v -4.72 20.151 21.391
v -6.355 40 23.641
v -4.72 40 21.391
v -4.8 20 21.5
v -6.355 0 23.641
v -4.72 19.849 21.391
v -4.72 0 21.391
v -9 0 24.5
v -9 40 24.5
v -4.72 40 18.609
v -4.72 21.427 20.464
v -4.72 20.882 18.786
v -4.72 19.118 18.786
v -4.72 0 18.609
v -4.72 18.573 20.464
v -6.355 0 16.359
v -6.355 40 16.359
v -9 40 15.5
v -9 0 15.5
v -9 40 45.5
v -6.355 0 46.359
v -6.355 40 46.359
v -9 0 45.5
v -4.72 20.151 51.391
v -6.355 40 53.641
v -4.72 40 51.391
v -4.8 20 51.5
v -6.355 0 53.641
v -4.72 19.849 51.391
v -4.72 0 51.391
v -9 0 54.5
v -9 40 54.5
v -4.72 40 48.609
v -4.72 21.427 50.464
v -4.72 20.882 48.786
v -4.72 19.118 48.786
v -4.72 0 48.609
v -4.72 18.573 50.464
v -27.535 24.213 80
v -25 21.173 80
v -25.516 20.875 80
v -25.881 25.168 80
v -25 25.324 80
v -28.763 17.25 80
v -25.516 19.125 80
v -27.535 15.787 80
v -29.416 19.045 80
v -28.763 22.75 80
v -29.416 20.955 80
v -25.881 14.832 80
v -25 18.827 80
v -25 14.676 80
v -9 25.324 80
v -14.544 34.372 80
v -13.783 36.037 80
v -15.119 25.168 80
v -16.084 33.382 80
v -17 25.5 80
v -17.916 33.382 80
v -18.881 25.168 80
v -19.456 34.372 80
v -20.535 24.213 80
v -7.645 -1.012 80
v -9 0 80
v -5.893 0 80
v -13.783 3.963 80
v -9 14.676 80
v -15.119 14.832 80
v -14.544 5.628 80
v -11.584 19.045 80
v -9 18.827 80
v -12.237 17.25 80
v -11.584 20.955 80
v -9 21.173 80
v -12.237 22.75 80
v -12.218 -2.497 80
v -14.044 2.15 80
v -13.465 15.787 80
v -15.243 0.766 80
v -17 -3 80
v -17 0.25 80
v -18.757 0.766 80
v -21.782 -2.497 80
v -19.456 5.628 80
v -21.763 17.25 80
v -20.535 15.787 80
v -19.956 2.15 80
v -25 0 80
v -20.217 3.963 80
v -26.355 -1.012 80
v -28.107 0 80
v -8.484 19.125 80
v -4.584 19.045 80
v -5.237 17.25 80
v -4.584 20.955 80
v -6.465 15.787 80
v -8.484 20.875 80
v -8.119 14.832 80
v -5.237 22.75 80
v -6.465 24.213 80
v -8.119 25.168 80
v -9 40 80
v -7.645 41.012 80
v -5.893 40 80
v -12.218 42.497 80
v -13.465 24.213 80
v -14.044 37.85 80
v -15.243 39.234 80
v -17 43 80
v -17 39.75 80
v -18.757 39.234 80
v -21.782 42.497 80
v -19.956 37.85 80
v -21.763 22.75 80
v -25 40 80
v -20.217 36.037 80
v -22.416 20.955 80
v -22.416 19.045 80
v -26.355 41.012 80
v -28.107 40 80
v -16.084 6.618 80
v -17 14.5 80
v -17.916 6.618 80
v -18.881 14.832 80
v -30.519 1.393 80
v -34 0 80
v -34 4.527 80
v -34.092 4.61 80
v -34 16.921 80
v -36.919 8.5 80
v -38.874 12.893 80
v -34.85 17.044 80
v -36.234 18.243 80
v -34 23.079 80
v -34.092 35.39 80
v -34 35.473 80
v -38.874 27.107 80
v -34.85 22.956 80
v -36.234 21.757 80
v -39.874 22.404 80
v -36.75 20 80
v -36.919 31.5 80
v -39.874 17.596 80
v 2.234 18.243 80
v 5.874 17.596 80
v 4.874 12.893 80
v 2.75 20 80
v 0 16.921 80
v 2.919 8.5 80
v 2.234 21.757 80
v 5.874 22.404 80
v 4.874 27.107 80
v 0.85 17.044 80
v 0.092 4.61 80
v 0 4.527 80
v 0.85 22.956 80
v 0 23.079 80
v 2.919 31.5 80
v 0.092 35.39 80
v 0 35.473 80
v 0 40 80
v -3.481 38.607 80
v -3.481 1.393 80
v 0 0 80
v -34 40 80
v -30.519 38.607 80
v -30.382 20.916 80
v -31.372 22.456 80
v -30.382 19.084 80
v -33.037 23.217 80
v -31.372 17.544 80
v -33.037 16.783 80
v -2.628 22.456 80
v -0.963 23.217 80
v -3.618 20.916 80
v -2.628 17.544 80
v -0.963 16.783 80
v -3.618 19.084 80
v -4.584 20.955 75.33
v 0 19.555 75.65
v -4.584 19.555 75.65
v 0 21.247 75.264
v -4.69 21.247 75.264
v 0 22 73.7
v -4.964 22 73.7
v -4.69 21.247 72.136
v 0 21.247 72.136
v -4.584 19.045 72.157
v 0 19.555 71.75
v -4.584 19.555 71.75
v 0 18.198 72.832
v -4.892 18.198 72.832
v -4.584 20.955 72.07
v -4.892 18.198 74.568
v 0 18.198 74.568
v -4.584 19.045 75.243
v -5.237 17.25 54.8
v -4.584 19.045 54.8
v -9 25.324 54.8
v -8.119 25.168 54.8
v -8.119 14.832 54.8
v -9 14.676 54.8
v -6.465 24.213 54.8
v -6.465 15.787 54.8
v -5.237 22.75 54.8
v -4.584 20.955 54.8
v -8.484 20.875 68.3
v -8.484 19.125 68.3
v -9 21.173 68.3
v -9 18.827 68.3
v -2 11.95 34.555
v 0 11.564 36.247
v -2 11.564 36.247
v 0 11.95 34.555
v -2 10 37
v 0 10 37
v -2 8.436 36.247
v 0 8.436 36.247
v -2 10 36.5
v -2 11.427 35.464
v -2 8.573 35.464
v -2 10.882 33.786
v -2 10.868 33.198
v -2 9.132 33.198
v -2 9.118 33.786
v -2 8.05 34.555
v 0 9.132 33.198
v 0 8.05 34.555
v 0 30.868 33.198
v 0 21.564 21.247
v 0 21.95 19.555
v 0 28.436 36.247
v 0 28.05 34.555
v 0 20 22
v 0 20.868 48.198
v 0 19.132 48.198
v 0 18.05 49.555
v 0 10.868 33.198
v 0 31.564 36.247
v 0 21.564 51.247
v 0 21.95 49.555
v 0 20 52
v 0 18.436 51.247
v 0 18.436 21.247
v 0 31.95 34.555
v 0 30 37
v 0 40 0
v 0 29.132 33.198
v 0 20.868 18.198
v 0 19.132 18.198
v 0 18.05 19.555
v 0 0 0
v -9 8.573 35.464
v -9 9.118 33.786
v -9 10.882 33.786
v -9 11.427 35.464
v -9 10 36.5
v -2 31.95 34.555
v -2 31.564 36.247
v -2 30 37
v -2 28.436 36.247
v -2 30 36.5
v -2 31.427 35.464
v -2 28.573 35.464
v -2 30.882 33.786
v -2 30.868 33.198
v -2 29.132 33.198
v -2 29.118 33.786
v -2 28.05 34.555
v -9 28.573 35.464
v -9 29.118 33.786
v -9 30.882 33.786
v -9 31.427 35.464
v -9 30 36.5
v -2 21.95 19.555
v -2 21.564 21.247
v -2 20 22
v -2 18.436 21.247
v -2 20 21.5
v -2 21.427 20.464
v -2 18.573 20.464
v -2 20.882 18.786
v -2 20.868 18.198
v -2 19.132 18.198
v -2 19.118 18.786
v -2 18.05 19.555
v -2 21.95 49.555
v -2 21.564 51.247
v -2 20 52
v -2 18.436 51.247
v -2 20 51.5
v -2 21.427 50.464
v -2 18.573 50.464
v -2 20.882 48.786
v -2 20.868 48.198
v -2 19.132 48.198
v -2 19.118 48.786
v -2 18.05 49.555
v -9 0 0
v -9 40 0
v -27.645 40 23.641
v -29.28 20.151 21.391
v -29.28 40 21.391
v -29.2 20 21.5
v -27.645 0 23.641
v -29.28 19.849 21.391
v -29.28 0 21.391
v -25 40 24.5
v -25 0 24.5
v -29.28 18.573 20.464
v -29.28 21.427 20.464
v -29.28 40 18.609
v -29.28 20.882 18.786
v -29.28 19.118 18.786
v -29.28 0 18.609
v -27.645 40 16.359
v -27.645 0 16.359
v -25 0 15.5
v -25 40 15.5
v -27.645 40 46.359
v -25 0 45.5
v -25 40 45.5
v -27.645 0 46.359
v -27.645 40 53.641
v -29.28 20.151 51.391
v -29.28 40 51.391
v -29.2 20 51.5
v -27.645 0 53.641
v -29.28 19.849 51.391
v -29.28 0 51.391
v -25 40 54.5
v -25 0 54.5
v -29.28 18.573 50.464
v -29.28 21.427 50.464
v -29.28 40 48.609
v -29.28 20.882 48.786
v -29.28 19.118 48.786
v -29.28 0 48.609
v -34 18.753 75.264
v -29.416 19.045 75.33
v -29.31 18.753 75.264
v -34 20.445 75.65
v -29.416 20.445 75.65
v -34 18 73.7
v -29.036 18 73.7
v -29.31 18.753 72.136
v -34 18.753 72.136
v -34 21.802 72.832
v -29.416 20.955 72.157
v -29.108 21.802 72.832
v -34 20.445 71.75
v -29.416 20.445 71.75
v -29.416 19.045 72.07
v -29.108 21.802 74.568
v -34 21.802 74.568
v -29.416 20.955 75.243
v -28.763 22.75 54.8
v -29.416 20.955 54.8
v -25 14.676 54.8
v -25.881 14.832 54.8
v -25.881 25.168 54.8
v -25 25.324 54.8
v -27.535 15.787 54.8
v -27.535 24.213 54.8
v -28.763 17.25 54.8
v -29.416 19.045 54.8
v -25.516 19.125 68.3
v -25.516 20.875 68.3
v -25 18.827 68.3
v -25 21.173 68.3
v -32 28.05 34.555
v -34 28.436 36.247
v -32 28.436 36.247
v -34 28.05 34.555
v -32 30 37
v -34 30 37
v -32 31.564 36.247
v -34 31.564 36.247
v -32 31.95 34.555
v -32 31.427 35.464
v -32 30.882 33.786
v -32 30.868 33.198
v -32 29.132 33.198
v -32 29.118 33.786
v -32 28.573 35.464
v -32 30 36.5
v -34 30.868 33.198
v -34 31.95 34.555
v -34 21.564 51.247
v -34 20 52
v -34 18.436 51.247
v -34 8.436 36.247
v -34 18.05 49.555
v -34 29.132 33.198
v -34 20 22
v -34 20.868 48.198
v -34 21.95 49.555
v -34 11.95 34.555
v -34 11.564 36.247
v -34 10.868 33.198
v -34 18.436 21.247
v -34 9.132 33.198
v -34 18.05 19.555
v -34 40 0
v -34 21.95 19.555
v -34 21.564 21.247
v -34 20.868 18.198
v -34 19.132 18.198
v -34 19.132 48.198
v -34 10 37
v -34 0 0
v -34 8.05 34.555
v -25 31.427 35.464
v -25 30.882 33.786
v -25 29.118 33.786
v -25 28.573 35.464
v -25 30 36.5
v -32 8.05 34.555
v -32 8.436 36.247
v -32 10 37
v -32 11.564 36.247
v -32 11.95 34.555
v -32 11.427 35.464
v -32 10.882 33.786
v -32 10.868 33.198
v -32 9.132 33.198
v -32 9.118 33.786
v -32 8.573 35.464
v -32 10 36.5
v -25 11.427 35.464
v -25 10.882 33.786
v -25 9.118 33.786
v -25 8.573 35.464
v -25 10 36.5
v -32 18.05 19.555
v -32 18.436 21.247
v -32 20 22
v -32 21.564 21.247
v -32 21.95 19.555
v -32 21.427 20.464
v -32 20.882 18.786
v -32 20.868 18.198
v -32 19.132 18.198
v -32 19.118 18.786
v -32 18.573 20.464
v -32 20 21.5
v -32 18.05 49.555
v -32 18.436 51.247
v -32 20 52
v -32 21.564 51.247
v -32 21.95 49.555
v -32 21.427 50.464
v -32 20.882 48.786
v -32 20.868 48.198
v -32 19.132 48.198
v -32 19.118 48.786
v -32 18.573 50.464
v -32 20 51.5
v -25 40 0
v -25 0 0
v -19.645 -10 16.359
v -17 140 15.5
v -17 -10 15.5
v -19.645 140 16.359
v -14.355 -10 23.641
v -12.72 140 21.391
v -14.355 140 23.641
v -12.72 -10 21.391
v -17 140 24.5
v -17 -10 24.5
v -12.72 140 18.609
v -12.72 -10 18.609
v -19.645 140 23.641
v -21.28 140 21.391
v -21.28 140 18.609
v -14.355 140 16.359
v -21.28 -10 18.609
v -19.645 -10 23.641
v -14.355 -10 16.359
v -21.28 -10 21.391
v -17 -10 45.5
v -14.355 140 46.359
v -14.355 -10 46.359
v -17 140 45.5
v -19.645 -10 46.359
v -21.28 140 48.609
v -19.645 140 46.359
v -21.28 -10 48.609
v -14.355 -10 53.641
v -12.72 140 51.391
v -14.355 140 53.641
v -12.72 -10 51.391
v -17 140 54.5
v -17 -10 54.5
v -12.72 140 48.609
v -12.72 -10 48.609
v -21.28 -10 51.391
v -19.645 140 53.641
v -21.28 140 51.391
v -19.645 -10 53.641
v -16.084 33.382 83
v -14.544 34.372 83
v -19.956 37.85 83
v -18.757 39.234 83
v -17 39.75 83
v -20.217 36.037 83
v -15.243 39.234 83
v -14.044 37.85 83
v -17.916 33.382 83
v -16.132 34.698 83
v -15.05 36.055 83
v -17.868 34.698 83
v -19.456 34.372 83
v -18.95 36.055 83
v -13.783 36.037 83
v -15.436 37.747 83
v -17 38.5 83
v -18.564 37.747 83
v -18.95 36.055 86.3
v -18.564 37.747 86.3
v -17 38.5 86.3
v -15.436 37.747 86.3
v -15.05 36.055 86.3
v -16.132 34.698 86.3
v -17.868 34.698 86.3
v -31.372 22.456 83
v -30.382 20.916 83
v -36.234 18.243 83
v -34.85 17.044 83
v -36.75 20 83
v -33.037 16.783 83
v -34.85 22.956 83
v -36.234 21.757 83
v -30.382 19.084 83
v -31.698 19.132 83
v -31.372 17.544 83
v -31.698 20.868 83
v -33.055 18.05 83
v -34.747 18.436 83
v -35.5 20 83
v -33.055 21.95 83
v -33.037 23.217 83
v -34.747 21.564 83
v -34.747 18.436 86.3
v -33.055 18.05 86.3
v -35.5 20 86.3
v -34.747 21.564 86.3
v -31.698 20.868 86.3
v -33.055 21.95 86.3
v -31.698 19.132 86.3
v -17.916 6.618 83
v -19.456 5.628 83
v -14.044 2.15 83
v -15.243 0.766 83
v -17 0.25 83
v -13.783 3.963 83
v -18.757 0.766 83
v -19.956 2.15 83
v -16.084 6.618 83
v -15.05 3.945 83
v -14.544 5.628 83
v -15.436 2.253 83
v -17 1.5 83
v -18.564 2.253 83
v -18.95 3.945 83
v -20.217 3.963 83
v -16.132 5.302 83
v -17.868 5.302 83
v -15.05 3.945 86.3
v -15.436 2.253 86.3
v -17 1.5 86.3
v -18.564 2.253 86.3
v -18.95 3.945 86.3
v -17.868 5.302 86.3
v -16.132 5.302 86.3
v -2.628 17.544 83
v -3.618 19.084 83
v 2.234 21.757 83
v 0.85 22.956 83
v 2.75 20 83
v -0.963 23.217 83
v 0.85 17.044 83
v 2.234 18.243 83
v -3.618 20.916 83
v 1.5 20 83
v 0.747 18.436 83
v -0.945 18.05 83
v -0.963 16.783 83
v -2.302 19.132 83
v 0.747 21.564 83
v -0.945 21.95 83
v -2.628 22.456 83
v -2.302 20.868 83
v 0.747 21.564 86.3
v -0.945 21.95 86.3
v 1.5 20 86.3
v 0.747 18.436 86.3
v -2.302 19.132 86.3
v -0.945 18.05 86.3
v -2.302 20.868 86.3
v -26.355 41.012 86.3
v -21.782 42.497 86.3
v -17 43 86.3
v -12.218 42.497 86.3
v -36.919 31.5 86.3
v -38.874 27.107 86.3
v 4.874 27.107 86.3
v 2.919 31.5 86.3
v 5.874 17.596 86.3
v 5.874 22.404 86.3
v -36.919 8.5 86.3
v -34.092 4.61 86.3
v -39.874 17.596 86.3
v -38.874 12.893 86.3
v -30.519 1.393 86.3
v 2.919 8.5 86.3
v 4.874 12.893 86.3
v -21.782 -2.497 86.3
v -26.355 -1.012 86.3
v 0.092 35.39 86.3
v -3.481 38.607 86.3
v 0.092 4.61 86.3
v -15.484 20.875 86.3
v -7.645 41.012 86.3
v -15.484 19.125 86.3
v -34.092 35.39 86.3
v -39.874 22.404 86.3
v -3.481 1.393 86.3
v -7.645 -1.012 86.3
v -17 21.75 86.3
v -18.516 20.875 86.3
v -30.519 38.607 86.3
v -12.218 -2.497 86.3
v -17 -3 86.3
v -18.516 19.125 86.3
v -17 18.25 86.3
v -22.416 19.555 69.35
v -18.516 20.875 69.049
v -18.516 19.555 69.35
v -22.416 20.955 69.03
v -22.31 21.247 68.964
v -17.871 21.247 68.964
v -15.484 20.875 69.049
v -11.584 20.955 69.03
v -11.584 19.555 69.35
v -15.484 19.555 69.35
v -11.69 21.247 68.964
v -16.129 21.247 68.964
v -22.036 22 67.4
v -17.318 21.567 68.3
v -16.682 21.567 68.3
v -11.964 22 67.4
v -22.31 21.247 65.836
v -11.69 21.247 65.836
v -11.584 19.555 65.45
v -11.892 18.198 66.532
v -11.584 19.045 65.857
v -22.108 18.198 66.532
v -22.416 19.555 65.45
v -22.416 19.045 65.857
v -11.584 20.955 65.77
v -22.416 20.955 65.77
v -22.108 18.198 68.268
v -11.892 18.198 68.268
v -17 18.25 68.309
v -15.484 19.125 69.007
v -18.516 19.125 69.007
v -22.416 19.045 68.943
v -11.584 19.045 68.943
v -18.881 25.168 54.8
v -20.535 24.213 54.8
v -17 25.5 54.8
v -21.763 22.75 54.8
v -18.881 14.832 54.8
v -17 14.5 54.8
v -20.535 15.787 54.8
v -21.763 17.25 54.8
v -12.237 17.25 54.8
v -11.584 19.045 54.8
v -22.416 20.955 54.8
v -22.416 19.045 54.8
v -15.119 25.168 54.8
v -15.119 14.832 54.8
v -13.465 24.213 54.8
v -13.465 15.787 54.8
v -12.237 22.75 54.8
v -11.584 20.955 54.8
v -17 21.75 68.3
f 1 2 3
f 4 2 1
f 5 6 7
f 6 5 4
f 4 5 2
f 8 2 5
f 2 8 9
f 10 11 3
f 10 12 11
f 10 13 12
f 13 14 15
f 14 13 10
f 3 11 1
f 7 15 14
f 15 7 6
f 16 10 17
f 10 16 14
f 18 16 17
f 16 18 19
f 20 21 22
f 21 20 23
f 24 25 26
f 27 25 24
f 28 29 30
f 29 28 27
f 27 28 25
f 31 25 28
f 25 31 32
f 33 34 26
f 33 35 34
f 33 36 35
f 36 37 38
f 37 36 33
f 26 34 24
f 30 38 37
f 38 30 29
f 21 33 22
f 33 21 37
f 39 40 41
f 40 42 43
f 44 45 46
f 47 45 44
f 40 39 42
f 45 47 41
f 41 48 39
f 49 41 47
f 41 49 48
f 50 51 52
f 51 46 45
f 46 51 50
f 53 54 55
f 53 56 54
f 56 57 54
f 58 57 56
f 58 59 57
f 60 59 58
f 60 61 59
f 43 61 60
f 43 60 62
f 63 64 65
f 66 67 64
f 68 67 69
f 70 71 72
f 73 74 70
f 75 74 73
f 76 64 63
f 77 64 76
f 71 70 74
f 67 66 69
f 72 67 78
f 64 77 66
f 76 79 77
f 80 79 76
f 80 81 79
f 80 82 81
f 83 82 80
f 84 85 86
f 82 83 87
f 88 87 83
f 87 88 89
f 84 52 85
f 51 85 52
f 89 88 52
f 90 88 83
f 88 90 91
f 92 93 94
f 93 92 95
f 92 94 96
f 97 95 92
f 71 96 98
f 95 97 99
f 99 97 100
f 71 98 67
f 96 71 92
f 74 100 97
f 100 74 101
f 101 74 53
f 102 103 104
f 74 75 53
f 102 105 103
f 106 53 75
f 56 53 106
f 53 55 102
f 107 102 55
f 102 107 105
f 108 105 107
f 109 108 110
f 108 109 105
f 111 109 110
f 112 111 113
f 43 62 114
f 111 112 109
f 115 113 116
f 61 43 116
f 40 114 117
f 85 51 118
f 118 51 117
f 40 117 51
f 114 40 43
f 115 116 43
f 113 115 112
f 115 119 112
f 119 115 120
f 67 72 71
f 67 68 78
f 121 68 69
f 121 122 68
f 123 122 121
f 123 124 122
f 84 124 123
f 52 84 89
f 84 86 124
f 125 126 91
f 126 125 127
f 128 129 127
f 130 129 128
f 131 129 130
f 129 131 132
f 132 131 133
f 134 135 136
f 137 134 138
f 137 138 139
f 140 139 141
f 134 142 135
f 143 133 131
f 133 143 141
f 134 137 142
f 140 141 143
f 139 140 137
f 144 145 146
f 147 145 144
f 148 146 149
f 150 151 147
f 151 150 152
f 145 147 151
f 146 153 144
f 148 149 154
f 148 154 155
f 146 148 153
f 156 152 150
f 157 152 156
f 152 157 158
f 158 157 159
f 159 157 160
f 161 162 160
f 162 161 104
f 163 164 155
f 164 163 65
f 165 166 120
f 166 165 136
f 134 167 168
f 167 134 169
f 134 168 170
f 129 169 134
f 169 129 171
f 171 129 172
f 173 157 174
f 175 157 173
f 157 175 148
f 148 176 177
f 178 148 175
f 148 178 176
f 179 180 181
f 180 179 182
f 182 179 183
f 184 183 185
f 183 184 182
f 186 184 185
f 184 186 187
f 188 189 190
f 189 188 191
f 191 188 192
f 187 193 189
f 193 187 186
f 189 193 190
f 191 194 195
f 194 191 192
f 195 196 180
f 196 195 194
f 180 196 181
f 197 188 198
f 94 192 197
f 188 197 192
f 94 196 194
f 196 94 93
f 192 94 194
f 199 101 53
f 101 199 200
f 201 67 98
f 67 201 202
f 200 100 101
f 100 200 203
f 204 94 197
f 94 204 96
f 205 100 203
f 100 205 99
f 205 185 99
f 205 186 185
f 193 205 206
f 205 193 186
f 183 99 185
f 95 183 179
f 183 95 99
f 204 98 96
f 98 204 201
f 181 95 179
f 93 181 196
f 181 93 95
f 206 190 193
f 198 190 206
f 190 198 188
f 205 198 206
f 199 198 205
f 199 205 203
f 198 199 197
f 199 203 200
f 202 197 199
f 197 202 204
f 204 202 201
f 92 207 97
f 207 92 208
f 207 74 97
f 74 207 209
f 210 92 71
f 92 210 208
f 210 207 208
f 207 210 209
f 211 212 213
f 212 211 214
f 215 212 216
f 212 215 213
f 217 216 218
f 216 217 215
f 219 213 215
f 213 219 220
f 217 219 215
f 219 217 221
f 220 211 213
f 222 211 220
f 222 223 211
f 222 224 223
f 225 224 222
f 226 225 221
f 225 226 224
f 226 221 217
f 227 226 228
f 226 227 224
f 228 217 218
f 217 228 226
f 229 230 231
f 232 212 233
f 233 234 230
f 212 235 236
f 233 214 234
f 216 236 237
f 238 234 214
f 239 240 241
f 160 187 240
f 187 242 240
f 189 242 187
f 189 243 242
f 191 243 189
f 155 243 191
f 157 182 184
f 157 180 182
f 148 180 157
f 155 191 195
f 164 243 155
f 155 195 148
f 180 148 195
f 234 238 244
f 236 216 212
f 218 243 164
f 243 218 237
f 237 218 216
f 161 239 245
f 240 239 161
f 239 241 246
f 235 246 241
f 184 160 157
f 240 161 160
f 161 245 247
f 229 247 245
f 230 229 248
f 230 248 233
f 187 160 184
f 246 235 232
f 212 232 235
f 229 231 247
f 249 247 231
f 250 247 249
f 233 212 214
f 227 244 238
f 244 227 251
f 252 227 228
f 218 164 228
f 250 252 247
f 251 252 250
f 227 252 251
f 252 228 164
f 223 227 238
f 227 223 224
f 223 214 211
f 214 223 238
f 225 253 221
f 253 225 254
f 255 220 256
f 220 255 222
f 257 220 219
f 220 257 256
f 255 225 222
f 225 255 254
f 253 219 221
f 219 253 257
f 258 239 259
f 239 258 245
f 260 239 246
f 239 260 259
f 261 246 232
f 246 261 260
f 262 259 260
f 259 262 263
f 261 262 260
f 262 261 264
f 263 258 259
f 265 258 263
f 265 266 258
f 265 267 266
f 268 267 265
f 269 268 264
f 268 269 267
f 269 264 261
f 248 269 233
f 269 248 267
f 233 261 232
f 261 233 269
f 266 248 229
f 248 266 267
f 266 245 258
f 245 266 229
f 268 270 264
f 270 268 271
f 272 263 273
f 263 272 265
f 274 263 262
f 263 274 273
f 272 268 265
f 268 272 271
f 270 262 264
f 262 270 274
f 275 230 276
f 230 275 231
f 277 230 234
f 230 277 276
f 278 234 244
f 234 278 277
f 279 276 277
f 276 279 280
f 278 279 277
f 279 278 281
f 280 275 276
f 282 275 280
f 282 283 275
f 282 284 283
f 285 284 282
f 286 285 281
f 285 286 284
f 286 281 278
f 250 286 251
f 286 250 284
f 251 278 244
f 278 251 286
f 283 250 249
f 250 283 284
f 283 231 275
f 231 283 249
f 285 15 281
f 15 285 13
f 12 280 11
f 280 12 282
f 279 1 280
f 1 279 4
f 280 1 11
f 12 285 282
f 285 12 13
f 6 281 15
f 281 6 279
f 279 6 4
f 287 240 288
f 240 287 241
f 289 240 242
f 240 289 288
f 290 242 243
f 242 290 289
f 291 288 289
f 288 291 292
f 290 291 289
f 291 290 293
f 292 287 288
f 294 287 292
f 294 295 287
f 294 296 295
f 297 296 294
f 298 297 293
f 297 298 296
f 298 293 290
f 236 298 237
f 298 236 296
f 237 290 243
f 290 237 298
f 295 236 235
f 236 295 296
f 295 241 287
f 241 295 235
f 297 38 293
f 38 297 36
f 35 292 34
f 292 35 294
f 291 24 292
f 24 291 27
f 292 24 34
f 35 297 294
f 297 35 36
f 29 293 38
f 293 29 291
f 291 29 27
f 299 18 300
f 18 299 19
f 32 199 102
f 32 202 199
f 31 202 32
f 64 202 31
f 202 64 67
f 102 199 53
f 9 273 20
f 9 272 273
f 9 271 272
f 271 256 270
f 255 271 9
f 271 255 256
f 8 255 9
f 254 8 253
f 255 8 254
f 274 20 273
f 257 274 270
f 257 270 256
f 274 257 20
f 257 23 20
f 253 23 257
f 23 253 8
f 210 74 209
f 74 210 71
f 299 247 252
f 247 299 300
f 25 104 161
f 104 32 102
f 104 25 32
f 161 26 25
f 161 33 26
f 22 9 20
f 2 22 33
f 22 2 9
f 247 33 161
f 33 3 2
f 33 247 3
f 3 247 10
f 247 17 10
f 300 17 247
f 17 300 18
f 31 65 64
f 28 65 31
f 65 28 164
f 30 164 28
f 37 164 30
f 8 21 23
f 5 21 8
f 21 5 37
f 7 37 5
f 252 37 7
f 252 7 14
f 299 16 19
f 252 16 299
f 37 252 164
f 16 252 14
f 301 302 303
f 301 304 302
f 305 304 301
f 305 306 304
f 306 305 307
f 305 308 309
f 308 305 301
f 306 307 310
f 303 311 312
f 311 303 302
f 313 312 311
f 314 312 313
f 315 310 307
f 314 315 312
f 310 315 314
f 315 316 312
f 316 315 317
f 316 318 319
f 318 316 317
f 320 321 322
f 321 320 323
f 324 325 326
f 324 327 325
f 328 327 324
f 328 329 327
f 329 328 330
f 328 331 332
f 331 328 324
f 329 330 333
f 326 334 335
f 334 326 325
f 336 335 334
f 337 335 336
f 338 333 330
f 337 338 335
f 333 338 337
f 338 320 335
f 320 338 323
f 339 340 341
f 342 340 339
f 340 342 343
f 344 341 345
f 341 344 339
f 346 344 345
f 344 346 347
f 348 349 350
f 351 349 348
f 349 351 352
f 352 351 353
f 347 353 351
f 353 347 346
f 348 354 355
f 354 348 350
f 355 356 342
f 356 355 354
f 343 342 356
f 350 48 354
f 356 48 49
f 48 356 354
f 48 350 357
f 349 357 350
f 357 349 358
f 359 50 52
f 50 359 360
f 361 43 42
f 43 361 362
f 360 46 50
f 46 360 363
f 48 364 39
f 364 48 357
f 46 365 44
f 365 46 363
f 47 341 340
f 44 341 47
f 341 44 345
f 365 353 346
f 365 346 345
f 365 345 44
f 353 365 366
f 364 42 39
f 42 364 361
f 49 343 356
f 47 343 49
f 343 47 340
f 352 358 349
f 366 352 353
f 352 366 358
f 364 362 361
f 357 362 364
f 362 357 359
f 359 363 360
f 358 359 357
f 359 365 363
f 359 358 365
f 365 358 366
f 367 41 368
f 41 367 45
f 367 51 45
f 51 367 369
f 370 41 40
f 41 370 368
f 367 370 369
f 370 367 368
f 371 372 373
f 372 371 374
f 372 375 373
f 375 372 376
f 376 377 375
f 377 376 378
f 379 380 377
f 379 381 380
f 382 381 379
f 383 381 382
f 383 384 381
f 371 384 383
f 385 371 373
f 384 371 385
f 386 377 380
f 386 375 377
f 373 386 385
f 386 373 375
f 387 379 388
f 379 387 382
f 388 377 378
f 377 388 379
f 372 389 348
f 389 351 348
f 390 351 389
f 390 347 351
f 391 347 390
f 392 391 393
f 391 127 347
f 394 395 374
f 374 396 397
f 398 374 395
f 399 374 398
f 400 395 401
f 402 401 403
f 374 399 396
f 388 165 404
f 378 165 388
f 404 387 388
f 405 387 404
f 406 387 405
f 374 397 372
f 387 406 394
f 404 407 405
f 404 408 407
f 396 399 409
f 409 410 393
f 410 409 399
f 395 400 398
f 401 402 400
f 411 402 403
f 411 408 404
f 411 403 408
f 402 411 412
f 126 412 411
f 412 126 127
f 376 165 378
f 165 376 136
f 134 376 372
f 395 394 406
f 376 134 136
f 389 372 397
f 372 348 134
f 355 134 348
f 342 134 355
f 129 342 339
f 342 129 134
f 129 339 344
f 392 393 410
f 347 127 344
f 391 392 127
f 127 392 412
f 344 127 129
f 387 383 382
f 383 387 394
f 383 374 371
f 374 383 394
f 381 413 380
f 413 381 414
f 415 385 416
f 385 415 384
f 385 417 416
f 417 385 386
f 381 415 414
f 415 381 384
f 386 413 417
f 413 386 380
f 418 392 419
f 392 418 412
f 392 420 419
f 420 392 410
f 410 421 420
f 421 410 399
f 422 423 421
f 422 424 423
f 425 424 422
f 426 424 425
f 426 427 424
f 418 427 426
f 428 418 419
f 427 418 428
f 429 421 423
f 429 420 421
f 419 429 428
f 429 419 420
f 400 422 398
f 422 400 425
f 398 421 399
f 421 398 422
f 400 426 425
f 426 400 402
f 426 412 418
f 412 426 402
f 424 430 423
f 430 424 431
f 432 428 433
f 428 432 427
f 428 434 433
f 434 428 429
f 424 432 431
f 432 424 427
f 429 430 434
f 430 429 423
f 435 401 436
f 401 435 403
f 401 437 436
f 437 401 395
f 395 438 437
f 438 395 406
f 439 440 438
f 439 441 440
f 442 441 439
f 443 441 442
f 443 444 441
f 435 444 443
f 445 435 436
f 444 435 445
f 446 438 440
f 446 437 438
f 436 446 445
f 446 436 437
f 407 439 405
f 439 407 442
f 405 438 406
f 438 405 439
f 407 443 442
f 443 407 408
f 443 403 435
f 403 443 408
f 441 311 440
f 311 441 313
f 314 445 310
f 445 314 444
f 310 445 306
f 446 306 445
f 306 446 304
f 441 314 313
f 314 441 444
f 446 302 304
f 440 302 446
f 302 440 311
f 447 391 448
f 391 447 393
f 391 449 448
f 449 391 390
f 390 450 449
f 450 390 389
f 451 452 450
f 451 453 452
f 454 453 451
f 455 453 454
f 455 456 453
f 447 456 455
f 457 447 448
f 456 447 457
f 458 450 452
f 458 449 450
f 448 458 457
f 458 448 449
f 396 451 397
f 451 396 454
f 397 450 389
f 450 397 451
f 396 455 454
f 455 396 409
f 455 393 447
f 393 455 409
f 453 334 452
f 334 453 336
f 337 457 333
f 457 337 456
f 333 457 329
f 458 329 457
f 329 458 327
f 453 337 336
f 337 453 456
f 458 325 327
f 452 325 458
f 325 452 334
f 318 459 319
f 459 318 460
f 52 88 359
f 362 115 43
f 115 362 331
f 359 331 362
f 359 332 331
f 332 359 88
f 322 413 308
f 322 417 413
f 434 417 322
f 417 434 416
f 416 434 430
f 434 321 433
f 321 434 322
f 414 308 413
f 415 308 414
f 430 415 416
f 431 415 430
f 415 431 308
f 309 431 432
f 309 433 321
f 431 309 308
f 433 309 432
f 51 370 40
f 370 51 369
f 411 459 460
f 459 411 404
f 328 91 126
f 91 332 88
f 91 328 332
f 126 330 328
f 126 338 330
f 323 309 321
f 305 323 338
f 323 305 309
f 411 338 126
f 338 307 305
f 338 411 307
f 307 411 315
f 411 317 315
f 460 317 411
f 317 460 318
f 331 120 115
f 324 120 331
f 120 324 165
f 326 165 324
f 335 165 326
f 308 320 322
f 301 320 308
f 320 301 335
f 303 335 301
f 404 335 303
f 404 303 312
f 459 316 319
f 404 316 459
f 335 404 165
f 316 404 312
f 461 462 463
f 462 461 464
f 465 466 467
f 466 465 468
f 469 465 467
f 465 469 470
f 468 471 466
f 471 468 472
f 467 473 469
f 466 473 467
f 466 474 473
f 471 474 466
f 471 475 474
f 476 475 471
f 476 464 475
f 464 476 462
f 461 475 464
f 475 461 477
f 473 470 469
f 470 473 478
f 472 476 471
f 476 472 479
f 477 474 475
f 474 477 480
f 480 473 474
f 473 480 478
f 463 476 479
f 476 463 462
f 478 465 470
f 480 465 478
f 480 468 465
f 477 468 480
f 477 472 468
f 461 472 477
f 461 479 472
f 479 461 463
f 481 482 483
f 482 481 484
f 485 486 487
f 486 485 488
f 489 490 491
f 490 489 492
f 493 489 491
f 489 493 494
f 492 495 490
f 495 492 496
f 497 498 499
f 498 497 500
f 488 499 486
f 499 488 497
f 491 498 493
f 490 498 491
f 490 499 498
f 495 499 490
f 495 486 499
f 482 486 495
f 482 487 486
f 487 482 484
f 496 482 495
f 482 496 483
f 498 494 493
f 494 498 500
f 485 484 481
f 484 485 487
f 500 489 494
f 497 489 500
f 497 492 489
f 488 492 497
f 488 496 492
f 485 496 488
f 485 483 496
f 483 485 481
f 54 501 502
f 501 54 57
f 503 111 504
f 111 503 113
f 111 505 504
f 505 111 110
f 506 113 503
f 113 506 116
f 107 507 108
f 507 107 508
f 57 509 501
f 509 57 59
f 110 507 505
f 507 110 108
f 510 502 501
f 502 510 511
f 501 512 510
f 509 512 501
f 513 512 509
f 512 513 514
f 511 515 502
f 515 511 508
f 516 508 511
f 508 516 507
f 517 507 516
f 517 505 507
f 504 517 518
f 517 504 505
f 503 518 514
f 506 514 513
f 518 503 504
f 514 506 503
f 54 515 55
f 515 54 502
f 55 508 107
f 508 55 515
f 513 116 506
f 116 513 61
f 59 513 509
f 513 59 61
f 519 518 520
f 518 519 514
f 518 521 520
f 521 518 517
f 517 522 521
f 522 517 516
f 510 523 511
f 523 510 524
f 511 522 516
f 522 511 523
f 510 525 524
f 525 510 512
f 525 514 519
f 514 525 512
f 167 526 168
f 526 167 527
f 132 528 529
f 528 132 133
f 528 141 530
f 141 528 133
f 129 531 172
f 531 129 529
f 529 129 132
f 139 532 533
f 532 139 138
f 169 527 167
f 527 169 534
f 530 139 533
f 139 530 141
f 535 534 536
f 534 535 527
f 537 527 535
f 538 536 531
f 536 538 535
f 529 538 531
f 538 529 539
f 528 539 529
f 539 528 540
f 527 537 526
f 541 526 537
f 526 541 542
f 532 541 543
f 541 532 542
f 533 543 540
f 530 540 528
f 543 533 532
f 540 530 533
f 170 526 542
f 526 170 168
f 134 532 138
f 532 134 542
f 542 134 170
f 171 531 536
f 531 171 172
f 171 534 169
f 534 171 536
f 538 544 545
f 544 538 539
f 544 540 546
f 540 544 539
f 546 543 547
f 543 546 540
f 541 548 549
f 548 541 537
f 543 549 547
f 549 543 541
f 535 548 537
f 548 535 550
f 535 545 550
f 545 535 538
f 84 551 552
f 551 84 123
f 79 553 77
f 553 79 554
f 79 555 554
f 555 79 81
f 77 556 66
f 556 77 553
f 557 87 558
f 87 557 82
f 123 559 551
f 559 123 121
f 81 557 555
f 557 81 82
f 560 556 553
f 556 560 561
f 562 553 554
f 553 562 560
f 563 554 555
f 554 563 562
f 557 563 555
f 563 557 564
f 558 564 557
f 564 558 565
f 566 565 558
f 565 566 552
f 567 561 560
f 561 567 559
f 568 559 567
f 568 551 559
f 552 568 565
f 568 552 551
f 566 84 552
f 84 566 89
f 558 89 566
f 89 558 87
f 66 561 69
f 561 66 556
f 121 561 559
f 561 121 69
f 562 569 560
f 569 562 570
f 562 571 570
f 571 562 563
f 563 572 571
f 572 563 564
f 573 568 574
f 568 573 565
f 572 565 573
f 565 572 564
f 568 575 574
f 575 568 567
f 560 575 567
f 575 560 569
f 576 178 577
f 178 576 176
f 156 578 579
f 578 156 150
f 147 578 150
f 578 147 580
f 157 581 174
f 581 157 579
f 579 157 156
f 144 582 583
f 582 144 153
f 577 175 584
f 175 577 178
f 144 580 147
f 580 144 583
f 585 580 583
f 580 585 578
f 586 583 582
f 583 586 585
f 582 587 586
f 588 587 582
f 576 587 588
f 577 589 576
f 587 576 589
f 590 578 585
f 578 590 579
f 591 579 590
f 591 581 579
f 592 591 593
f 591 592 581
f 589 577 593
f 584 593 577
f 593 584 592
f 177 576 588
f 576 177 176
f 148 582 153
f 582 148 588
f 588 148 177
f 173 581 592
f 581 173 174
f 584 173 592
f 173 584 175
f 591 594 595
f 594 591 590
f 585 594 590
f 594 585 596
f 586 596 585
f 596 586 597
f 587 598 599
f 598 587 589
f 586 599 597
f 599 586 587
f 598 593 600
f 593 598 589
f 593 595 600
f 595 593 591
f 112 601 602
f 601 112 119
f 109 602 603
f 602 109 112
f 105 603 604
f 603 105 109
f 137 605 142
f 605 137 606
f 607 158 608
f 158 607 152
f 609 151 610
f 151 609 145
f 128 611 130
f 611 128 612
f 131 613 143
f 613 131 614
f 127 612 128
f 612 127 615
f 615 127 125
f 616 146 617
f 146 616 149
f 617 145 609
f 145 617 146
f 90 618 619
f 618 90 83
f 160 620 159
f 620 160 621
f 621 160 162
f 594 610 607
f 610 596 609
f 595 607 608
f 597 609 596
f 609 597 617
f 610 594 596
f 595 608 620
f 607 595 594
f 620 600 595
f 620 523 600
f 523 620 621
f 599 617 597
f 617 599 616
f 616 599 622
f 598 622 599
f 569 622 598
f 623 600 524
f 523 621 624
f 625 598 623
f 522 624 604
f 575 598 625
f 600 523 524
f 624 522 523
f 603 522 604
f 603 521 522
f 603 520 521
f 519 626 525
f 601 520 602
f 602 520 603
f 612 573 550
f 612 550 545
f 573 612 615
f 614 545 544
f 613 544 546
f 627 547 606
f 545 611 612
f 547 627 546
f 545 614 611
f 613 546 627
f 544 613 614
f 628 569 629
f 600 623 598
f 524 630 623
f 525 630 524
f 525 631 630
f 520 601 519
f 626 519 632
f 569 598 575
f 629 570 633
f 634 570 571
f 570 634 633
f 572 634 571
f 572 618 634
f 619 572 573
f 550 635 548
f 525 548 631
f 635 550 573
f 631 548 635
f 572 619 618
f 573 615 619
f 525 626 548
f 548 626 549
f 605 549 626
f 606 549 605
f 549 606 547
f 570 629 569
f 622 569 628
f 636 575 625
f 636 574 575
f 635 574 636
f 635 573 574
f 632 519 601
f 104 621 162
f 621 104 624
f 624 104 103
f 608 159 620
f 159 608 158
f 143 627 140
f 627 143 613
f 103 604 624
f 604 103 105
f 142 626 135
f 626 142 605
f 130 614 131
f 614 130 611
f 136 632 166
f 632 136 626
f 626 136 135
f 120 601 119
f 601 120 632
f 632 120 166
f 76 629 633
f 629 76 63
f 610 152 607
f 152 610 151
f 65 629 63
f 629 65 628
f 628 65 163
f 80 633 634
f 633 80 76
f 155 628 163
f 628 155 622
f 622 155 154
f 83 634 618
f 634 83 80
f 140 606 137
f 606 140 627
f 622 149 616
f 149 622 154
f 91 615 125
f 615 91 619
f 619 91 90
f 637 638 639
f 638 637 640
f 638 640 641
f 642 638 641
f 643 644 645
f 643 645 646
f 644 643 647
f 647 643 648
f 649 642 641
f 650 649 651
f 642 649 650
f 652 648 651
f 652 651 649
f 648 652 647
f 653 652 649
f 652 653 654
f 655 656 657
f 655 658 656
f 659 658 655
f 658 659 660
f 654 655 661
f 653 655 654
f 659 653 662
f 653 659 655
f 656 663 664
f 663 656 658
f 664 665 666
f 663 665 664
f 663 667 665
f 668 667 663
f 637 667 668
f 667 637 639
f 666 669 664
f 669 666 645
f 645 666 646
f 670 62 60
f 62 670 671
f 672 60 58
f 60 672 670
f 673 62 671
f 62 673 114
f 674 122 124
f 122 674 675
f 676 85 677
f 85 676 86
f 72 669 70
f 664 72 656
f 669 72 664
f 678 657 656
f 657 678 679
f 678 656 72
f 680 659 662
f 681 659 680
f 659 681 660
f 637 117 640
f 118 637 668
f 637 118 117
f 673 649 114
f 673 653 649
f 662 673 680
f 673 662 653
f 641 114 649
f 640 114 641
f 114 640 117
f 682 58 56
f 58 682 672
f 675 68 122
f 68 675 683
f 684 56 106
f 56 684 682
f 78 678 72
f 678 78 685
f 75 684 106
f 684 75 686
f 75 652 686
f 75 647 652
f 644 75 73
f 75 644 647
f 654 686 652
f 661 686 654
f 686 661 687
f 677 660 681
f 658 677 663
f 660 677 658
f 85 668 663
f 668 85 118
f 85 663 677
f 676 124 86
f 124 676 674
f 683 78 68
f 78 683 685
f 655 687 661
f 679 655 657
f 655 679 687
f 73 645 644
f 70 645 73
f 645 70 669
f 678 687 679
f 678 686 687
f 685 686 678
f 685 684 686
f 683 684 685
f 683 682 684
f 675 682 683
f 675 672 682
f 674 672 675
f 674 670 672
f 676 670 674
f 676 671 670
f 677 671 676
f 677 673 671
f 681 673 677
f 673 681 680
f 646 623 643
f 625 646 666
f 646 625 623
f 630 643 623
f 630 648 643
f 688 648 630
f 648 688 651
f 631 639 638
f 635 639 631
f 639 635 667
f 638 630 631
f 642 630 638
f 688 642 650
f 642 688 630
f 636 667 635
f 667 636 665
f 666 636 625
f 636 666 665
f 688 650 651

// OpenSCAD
// file: stanley.scad
use <hardware.scad>

module stanley(solid_screw = false) {
    motor_r = 23;
    stem_r = 5.5;
    retainer_r = stem_r;
    motor_disk_height = 6.3;
    screw_count = 4;
		stem_height = motor_disk_height * 3;
		back_axle_length = 18;

    difference () {
				union() {
						difference() {
								cylinder(r=motor_r, h=motor_disk_height);
								for (i = [0:screw_count-1]) {
										rotate(v=[0,0,1], a = i * 360 / screw_count) {
												translate(v=[16.5, 0, 0]) m3();
										}
								}
						}
	
						difference() {
								translate(v=[0, 0, -stem_height]) {
										cylinder(r=stem_r, h=stem_height);
								}
								
								if (!solid_screw) {
										translate(v=[0, 10, -stem_height + motor_disk_height]) {
												rotate (v=[1, 0, 0], 90) m3(40);
										}
								}
						}

						translate(v=[0, 0, -motor_disk_height - stem_height]) {
								cylinder(r=retainer_r, h=motor_disk_height);
						}

						if (solid_screw) {
								translate(v=[0, 20, -motor_disk_height]) {
										rotate (v=[1, 0, 0], 90) m3(40);
								}
						}
				}

				translate(v=[0, 0, -back_axle_length + motor_disk_height]) {
						cylinder(h=back_axle_length, r=1.75);
				}
		}
}			

rotate(v=[1,0,0], 180) stanley();
// file: hardware.scad
axle_r = 4.5;
axle_separation = 30;

module axle(h) {
	rotate(v=[-1,0,0], a=90) cylinder(r=axle_r, h=h, $fn=10);
}

module axlepair(h=100) {
	union() {
		axle(h);
		translate(v=[axle_separation, 0, 0]) axle(h);
	}
}

module m2(h=16) {
	union() {
		cylinder(r=2, h=2);
		cylinder(r=1.5, h=h);
	}
}

module m3(h=16) {
	union() {
		cylinder(r=3.25, h=3);
		cylinder(r=2, h=h);
	}
}

module m5(h=16) {
	union() {
		cylinder(r=4.5, h=5);
		cylinder(r=3, h=h);
	}
}
// file: fred.scad
include <hardware.scad>
use <stanley.scad>

module fred() {
	h = 2 * axle_r;

	difference() {
		cube([80, 40, h]);

		translate(v=[20, -10, h]) axlepair();

		translate(v=[80, 20, 10]) {
			rotate(v=[1,0,0], 90) 
				rotate(v=[0,1,0], 90) stanley(solid_screw=true);
		}

		for (v = [[20+axle_separation/2, 10, 0],
				[20+axle_separation/2, 30, 0]])
			translate(v=v) m2();

		for (v = [[20,20,0],[20+axle_separation,20,0]])
			translate(v=v) m2();
	}
}

fred();
// main file
use <fred.scad>
use <hardware.scad>
use <stanley.scad>

rotate(v=[0,1,0], a=270)
union() {
    fred();
    translate([0,40,34]) rotate(v=[1,0,0],180) fred();
    translate([20,-10,17]) axlepair(150);
    translate([80,20,17]) {
	rotate(v=[0,1,0], 90) {
	    rotate(90) stanley(false);
	}
    }
}
